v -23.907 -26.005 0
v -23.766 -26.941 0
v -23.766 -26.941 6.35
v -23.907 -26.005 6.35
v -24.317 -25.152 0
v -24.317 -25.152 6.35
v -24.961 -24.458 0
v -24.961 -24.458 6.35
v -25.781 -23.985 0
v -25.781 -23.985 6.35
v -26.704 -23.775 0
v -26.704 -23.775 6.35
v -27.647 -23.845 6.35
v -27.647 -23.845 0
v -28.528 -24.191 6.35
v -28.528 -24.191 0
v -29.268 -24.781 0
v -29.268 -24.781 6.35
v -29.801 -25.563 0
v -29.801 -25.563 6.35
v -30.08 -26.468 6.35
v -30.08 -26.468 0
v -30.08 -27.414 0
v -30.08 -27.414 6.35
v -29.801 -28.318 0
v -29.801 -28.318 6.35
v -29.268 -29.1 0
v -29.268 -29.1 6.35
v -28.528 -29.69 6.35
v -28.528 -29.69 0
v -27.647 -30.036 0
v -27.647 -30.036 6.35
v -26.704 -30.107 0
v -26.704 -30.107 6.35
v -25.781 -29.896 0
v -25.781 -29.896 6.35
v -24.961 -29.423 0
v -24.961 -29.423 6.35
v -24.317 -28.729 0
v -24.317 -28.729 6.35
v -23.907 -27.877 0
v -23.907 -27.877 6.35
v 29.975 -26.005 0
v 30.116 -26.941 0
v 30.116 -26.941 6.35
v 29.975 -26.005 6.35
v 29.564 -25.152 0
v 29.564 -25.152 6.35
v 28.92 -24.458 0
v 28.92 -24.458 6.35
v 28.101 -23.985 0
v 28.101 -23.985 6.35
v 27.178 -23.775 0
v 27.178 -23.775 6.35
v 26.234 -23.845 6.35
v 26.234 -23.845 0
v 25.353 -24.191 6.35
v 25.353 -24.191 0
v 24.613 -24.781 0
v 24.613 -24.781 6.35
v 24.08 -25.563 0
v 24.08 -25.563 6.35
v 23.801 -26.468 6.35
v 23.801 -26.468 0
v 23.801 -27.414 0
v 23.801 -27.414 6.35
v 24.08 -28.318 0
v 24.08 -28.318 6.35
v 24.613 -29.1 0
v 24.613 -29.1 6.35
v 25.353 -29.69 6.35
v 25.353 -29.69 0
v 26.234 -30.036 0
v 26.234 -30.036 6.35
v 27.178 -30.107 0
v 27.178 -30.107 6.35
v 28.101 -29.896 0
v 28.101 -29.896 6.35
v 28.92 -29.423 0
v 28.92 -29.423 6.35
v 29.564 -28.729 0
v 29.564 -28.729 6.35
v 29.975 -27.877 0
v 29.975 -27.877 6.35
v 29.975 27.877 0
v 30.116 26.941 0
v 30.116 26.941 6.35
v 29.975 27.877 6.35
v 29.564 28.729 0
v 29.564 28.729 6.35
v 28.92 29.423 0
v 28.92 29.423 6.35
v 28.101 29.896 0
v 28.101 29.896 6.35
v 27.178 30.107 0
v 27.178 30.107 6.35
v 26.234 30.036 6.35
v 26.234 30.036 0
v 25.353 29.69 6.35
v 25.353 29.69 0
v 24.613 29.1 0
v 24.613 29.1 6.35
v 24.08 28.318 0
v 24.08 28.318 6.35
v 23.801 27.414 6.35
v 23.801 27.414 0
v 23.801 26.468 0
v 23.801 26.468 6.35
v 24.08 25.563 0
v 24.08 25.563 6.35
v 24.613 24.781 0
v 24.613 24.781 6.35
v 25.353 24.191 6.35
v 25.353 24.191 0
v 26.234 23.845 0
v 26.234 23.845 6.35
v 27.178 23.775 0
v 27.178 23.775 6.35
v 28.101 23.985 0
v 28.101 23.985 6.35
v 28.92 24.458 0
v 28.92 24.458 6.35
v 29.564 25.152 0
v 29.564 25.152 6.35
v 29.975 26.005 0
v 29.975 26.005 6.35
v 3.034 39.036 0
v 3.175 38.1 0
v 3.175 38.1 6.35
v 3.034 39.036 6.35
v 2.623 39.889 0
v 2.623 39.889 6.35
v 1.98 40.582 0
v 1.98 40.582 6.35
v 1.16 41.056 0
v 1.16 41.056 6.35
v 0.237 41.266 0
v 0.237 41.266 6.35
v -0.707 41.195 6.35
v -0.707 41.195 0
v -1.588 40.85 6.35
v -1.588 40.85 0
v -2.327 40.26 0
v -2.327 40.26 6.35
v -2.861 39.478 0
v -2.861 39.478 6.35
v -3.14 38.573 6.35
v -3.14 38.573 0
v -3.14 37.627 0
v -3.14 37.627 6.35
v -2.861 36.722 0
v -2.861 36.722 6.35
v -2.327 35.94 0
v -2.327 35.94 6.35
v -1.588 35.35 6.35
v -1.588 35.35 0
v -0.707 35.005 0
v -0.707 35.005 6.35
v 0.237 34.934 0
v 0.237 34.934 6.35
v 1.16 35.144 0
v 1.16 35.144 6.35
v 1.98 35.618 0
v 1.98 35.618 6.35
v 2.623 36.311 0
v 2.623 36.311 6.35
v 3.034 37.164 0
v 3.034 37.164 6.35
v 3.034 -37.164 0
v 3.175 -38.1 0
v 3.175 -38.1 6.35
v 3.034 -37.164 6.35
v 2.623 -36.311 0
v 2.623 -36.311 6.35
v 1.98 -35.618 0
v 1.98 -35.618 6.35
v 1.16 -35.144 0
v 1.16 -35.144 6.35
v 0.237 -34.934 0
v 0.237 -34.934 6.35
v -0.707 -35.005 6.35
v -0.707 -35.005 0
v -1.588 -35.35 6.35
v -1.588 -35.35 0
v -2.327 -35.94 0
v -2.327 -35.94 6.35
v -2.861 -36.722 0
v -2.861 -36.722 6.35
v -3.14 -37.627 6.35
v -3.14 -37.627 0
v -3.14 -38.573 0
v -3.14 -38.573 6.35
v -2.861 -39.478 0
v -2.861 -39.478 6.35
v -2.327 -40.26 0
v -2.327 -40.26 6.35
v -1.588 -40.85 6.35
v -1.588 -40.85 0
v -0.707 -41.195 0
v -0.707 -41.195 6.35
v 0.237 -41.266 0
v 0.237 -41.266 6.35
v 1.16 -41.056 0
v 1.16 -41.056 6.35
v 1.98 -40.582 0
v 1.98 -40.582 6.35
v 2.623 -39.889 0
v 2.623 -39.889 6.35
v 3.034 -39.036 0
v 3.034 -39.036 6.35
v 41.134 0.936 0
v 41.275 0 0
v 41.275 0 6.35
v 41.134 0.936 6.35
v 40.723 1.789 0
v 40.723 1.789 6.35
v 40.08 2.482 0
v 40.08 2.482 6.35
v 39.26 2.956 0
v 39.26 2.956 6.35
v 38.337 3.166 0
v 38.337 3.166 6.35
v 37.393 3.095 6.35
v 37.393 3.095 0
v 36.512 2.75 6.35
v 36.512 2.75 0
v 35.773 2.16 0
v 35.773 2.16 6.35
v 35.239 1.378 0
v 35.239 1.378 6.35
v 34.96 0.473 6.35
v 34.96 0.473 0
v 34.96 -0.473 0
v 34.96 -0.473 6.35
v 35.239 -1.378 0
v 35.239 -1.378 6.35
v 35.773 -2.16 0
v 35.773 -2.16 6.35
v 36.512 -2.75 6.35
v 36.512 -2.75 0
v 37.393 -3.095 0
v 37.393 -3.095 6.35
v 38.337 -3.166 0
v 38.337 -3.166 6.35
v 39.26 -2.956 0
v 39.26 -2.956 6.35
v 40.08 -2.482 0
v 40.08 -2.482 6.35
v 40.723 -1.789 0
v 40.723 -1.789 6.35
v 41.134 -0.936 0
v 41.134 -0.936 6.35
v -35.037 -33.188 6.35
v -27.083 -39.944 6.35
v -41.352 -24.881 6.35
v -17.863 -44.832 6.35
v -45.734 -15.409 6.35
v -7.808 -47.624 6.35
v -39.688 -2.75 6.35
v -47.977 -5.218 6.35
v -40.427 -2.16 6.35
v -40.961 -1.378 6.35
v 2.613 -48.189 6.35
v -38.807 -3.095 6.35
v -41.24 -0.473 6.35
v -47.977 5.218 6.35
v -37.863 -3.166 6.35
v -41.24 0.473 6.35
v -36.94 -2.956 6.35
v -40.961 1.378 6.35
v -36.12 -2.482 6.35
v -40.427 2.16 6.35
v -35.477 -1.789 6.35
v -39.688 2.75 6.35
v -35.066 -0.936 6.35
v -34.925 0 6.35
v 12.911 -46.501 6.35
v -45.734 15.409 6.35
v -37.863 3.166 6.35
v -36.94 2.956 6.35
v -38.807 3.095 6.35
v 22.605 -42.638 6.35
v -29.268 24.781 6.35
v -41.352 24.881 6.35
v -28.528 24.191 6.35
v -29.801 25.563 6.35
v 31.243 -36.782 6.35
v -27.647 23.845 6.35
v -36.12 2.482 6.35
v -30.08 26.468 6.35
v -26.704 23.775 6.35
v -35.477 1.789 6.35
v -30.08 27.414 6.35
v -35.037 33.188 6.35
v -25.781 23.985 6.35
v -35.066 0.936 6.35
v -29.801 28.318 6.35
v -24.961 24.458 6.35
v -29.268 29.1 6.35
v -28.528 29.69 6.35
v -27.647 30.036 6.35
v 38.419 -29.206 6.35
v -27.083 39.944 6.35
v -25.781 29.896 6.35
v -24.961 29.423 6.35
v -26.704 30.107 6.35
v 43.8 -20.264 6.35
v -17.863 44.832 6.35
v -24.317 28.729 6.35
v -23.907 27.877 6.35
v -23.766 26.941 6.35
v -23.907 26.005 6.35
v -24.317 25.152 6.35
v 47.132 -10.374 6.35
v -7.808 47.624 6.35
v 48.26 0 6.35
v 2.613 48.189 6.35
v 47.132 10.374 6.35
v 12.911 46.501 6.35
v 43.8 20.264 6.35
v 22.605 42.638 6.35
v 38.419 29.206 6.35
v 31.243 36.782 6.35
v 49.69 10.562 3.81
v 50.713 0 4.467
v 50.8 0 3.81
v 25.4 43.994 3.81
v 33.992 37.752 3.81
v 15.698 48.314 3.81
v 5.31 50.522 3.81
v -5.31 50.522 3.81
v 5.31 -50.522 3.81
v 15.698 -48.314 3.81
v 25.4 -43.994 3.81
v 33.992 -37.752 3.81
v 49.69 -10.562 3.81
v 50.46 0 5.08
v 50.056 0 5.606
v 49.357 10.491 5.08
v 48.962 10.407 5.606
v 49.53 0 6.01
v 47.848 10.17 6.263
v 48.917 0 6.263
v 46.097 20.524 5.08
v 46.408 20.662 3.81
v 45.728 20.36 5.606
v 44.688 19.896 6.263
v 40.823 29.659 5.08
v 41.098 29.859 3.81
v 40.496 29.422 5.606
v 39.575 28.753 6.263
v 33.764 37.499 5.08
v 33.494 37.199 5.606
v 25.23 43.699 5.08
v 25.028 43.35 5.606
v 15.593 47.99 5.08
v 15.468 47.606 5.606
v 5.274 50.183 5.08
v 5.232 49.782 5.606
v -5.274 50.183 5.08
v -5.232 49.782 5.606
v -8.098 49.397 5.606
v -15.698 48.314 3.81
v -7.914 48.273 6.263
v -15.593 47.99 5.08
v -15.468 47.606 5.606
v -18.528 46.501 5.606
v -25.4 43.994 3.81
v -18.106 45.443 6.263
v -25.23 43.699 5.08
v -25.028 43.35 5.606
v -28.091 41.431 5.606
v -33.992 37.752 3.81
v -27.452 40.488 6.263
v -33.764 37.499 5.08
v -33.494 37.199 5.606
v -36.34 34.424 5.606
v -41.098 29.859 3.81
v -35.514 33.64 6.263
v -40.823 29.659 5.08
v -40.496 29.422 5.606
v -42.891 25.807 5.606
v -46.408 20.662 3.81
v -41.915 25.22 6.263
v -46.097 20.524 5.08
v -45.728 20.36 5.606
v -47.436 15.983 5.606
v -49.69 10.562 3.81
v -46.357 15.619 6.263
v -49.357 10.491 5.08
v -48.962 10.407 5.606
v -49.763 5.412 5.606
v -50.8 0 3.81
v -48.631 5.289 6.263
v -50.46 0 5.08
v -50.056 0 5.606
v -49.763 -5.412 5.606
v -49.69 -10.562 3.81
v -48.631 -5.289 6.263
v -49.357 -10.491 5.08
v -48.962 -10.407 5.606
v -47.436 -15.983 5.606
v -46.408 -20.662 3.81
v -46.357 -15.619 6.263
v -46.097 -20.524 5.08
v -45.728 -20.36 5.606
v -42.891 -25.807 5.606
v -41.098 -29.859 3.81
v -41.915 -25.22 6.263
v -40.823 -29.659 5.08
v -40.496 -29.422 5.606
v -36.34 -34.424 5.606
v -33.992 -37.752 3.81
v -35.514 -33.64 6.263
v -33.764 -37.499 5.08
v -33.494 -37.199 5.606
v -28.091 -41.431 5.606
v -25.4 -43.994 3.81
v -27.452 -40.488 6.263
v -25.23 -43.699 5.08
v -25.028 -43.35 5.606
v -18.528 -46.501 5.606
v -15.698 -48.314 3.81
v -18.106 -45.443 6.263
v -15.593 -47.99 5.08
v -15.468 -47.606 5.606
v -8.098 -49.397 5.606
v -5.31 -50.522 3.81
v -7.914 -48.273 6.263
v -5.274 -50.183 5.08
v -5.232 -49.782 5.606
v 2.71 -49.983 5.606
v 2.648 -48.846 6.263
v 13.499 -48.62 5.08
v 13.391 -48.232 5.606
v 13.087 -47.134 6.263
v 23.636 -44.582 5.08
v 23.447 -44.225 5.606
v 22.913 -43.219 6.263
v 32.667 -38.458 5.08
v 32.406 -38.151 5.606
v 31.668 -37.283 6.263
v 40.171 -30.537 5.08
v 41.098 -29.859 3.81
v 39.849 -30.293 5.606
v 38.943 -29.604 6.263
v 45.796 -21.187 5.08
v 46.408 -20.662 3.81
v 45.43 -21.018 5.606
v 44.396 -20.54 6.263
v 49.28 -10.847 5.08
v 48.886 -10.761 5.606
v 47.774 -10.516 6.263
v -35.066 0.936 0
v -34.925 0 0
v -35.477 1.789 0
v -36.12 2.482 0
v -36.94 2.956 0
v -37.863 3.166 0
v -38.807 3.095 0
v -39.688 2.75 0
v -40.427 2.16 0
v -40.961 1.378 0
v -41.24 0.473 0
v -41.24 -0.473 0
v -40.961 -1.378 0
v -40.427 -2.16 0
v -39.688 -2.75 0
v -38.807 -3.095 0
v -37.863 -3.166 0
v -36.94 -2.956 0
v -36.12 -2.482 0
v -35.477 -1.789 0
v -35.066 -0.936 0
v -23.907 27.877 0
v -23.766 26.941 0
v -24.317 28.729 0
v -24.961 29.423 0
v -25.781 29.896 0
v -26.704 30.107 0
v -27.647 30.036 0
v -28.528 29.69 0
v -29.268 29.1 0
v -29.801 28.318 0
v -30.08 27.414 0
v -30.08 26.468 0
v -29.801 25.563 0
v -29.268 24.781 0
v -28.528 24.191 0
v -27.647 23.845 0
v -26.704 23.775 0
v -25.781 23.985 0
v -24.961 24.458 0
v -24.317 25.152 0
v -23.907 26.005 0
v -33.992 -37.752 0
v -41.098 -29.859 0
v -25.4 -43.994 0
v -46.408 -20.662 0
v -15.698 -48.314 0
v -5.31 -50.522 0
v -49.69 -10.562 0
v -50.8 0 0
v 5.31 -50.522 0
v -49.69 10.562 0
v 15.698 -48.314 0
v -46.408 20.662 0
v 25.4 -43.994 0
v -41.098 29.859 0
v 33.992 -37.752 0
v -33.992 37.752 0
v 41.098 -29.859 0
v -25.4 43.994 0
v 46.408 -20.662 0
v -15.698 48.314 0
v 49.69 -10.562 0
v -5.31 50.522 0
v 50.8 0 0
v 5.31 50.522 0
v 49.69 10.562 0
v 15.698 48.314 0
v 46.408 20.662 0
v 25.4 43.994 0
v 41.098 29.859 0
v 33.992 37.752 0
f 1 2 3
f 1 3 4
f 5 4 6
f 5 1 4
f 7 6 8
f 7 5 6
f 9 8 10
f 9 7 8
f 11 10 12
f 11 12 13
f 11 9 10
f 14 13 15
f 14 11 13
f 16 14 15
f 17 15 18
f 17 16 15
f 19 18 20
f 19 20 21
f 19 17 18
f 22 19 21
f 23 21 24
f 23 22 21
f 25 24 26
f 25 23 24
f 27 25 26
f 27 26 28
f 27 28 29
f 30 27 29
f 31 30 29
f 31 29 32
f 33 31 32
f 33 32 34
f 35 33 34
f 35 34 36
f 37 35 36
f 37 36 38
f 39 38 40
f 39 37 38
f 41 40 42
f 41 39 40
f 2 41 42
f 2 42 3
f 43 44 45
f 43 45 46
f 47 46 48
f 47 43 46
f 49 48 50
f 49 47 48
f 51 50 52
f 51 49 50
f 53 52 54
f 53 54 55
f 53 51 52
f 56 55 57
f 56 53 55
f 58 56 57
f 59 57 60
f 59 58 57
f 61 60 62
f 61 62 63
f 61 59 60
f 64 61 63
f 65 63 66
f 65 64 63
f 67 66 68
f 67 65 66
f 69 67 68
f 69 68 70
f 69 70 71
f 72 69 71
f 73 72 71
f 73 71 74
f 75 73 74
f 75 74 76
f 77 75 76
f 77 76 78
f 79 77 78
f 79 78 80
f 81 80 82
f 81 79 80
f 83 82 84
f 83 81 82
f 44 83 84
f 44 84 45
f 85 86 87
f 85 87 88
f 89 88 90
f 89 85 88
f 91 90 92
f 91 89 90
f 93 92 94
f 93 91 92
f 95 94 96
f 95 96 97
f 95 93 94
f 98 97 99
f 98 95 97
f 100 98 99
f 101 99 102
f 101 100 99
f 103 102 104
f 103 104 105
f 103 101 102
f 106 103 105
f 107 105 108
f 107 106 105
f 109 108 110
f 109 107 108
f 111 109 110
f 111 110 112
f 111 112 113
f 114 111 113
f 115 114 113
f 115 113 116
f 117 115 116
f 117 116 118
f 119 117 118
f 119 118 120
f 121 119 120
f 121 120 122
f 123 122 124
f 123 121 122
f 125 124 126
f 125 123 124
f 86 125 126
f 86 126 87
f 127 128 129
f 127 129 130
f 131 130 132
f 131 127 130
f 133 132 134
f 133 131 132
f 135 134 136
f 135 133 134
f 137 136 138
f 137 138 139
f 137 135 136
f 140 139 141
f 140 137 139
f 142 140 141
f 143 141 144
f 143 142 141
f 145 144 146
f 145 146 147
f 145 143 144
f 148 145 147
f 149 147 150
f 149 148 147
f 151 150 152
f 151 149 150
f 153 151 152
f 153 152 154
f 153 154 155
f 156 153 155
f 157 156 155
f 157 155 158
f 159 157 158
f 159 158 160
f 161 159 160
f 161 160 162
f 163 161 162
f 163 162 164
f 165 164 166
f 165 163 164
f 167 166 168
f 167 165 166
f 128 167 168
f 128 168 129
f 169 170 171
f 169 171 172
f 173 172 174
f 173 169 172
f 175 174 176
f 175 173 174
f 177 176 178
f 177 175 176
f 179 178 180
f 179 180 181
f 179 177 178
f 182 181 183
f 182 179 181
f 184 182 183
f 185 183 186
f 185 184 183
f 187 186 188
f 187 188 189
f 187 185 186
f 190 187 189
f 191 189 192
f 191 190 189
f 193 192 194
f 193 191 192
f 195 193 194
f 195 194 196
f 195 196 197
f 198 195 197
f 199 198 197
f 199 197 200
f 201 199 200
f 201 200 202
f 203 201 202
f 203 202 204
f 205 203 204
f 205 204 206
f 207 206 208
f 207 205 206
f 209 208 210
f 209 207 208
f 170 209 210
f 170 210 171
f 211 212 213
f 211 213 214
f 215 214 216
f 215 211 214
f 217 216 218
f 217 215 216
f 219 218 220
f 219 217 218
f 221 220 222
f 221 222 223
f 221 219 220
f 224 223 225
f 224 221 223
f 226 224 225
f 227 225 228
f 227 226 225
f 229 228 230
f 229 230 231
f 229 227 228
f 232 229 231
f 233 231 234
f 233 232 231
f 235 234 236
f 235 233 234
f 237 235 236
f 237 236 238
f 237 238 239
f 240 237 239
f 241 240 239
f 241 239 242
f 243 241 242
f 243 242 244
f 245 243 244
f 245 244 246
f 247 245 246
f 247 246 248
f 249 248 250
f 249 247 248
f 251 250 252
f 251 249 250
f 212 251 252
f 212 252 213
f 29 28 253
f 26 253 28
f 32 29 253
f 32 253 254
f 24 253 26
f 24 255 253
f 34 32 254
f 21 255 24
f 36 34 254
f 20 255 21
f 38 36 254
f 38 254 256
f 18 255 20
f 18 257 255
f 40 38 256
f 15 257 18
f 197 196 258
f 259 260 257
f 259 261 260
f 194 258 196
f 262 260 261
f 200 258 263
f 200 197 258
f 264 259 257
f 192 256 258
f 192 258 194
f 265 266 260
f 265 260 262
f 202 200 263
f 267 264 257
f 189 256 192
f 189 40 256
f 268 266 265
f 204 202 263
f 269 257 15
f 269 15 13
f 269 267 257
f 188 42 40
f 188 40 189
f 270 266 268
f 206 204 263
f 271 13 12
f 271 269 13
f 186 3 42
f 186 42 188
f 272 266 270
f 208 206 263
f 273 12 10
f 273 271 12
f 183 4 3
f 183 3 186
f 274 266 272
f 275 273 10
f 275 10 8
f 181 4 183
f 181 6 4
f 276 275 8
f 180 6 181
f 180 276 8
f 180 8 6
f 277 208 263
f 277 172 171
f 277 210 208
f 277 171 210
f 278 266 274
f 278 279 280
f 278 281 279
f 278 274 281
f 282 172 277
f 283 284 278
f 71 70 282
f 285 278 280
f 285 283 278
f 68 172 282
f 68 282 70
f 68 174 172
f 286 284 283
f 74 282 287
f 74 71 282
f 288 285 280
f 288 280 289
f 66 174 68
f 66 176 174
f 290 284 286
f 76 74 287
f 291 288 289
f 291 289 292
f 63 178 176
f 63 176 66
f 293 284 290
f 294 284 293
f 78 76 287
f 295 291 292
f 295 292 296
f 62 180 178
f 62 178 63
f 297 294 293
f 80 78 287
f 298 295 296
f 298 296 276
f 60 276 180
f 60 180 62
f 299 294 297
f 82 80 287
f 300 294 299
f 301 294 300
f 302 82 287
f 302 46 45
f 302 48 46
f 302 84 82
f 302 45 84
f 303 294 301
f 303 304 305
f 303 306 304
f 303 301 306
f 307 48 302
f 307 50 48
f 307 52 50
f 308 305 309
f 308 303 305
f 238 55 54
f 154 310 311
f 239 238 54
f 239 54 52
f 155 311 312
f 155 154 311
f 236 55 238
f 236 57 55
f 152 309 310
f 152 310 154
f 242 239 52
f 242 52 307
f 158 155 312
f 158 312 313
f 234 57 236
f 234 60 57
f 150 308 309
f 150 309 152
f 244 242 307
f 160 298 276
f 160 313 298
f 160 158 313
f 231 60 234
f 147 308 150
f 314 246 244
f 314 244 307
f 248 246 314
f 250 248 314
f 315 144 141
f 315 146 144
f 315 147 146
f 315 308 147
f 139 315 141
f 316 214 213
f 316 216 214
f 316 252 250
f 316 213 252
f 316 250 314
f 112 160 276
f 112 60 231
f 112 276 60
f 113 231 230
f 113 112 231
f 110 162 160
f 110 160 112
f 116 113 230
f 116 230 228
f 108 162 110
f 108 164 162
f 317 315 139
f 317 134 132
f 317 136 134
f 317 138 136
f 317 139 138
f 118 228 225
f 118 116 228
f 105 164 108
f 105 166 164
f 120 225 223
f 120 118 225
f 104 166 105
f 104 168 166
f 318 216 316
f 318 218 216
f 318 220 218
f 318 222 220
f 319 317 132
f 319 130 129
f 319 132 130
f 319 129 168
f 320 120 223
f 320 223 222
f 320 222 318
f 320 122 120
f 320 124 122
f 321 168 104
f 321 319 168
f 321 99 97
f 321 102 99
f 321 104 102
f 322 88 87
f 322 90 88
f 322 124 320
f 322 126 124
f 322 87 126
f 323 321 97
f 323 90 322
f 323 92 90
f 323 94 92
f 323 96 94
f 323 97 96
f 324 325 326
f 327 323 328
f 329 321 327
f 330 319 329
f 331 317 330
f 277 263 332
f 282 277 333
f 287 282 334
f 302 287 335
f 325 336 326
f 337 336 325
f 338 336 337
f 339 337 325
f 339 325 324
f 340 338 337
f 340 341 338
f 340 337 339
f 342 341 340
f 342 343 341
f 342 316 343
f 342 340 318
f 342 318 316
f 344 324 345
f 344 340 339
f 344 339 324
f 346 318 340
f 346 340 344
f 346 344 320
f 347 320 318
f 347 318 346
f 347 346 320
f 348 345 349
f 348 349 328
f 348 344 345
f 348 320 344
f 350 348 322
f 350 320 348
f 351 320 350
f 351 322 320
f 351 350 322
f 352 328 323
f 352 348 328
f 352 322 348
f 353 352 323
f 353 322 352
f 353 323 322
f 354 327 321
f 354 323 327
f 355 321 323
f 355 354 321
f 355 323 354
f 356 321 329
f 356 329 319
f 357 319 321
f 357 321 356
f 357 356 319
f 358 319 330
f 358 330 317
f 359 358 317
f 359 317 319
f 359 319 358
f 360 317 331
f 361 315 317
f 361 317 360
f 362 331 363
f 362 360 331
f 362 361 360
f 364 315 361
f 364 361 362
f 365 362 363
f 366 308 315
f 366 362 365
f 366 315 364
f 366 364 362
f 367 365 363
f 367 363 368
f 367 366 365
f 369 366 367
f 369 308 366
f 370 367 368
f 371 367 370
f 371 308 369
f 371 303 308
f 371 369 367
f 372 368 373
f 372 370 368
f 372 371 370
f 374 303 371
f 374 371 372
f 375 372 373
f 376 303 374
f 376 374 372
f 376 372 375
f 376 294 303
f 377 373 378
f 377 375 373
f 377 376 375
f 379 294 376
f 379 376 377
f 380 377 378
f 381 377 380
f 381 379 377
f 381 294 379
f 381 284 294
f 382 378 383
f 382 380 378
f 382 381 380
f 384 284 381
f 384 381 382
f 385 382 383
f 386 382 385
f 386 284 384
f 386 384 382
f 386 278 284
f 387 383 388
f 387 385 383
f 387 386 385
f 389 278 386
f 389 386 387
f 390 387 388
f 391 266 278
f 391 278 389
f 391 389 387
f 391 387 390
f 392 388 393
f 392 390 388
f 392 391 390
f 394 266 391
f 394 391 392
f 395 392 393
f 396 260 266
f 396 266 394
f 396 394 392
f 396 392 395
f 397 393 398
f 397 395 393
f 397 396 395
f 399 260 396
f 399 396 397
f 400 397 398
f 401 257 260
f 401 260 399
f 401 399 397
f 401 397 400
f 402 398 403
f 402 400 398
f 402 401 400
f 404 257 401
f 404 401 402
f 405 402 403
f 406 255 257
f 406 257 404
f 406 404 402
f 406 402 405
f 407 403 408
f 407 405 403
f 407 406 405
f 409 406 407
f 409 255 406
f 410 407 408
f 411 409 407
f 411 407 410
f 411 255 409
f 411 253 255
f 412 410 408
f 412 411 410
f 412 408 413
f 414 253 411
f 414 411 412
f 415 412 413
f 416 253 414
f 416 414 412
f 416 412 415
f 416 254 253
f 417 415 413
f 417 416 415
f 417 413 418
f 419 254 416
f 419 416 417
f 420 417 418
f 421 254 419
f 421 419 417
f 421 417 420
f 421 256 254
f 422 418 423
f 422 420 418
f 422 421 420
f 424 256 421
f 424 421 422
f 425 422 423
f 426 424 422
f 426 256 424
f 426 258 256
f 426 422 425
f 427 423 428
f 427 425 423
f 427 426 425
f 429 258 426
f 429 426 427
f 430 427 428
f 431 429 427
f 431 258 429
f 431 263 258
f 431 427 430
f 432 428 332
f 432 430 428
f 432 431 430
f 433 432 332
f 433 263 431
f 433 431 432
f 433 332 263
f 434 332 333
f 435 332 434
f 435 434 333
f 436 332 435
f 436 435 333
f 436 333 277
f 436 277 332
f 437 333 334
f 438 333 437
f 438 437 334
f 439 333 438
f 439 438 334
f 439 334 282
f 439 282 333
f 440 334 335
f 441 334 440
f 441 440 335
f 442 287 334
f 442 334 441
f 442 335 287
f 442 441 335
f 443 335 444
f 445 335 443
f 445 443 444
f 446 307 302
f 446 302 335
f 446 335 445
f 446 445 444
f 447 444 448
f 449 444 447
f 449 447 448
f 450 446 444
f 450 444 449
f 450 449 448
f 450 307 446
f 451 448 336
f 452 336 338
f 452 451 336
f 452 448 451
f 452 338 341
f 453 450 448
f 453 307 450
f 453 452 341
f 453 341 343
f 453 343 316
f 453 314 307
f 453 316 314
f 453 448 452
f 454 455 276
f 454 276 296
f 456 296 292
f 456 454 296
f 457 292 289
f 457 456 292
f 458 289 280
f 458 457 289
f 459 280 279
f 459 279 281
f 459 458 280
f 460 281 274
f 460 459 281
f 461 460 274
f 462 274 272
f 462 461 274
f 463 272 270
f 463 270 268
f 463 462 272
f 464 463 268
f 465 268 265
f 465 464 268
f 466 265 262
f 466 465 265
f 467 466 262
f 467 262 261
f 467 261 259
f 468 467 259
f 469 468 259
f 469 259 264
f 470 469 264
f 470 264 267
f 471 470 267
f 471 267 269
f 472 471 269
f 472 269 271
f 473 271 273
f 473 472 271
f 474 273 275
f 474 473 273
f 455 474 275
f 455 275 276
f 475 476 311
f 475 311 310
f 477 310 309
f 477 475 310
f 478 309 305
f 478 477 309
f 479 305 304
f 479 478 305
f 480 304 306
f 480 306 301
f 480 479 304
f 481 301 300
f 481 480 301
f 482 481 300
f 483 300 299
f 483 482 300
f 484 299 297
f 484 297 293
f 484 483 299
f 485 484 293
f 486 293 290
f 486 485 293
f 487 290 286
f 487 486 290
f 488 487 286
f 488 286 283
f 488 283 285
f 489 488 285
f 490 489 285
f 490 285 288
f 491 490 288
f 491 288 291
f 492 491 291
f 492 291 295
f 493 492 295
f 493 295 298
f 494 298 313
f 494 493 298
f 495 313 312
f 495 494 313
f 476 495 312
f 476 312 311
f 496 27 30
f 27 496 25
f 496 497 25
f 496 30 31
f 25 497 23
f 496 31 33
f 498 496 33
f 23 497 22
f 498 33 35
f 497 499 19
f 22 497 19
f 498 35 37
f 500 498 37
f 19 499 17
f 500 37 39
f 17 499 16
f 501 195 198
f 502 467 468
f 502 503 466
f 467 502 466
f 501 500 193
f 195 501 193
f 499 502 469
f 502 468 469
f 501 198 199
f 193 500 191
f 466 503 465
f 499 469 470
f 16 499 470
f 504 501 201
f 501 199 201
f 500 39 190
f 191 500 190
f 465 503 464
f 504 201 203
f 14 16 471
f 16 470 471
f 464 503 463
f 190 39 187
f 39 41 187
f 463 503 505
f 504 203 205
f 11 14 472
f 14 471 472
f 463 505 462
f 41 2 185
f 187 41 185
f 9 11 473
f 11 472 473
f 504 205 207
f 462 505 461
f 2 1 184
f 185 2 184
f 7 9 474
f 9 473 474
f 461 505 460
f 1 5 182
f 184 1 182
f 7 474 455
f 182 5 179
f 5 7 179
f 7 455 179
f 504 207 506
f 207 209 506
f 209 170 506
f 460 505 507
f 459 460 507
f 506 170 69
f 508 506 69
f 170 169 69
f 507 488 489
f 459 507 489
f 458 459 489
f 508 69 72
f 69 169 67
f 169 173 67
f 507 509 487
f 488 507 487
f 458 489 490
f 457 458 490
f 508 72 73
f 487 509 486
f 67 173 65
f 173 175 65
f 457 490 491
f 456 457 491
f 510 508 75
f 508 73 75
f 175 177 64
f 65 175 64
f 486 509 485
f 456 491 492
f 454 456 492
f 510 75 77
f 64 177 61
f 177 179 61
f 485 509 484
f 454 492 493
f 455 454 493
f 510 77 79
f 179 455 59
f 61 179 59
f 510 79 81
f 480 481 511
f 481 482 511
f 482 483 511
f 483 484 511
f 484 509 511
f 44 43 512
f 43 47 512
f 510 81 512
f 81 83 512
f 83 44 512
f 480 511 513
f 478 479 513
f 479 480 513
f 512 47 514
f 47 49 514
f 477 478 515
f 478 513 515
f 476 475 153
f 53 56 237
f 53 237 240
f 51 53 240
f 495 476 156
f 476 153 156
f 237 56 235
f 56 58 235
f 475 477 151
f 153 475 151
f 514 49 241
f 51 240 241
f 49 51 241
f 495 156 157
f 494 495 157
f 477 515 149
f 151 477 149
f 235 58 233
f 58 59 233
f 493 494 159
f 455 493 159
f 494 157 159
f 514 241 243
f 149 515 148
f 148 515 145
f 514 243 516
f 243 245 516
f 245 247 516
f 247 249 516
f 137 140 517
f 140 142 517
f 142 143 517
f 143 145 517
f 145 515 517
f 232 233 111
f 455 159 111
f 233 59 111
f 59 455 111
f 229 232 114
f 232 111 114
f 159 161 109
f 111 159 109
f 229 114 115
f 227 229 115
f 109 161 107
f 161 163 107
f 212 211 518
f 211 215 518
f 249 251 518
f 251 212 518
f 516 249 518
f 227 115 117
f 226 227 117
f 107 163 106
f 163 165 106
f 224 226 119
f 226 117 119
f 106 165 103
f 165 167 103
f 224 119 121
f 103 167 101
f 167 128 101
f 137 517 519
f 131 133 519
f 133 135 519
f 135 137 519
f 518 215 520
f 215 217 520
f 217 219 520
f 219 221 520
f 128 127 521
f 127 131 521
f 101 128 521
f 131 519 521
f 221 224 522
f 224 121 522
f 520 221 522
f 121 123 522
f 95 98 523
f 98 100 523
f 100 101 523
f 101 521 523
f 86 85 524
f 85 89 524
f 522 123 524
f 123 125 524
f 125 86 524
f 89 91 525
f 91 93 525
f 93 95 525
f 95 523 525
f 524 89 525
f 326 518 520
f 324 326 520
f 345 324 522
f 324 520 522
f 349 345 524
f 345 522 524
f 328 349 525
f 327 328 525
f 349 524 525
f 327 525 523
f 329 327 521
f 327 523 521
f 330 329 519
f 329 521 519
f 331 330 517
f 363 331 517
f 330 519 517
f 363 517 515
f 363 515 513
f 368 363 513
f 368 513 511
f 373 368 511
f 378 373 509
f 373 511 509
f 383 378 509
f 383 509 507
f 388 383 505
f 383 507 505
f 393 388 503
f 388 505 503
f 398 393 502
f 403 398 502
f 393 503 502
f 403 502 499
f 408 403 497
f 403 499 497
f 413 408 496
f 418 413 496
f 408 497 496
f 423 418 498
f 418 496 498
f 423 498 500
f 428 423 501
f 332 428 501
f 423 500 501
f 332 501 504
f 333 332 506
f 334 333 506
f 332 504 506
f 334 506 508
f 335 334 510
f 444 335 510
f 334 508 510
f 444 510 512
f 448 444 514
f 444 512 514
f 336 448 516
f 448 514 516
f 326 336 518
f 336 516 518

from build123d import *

# Parameters (mm, degrees)
F0_R     = 50.8
F0_R_2   = 3.175
F1_DEPTH = 6.35
F10_R    = 2.54


# Not quite as in the source:
# - the program builds the solid bodies; features that only make, move or delete a surface that nothing else refers to are left out


with BuildPart() as f1:
    # F0 (on Top) → F1 (new body)
    with BuildSketch(Plane.XY):
        Circle(F0_R)
        with Locations((-26.9407683632, -26.9407683632)):
            Circle(F0_R_2, mode=Mode.SUBTRACT)
        with Locations((0, -38.1)):
            Circle(F0_R_2, mode=Mode.SUBTRACT)
        with Locations((-38.1, 0)):
            Circle(F0_R_2, mode=Mode.SUBTRACT)
        with Locations((26.9407683632, -26.9407683632)):
            Circle(F0_R_2, mode=Mode.SUBTRACT)
        with Locations((38.1, 0)):
            Circle(F0_R_2, mode=Mode.SUBTRACT)
        with Locations((-26.9407683632, 26.9407683632)):
            Circle(F0_R_2, mode=Mode.SUBTRACT)
        with Locations((0, 38.1)):
            Circle(F0_R_2, mode=Mode.SUBTRACT)
        with Locations((26.9407683632, 26.9407683632)):
            Circle(F0_R_2, mode=Mode.SUBTRACT)
    extrude(amount=F1_DEPTH)

    # F10
    f10_edges = [f1.edges().sort_by_distance(p)[0] for p in [
        (-50.8, 0, 6.35),
    ]]
    fillet(f10_edges, radius=F10_R)


solid = f1.part
